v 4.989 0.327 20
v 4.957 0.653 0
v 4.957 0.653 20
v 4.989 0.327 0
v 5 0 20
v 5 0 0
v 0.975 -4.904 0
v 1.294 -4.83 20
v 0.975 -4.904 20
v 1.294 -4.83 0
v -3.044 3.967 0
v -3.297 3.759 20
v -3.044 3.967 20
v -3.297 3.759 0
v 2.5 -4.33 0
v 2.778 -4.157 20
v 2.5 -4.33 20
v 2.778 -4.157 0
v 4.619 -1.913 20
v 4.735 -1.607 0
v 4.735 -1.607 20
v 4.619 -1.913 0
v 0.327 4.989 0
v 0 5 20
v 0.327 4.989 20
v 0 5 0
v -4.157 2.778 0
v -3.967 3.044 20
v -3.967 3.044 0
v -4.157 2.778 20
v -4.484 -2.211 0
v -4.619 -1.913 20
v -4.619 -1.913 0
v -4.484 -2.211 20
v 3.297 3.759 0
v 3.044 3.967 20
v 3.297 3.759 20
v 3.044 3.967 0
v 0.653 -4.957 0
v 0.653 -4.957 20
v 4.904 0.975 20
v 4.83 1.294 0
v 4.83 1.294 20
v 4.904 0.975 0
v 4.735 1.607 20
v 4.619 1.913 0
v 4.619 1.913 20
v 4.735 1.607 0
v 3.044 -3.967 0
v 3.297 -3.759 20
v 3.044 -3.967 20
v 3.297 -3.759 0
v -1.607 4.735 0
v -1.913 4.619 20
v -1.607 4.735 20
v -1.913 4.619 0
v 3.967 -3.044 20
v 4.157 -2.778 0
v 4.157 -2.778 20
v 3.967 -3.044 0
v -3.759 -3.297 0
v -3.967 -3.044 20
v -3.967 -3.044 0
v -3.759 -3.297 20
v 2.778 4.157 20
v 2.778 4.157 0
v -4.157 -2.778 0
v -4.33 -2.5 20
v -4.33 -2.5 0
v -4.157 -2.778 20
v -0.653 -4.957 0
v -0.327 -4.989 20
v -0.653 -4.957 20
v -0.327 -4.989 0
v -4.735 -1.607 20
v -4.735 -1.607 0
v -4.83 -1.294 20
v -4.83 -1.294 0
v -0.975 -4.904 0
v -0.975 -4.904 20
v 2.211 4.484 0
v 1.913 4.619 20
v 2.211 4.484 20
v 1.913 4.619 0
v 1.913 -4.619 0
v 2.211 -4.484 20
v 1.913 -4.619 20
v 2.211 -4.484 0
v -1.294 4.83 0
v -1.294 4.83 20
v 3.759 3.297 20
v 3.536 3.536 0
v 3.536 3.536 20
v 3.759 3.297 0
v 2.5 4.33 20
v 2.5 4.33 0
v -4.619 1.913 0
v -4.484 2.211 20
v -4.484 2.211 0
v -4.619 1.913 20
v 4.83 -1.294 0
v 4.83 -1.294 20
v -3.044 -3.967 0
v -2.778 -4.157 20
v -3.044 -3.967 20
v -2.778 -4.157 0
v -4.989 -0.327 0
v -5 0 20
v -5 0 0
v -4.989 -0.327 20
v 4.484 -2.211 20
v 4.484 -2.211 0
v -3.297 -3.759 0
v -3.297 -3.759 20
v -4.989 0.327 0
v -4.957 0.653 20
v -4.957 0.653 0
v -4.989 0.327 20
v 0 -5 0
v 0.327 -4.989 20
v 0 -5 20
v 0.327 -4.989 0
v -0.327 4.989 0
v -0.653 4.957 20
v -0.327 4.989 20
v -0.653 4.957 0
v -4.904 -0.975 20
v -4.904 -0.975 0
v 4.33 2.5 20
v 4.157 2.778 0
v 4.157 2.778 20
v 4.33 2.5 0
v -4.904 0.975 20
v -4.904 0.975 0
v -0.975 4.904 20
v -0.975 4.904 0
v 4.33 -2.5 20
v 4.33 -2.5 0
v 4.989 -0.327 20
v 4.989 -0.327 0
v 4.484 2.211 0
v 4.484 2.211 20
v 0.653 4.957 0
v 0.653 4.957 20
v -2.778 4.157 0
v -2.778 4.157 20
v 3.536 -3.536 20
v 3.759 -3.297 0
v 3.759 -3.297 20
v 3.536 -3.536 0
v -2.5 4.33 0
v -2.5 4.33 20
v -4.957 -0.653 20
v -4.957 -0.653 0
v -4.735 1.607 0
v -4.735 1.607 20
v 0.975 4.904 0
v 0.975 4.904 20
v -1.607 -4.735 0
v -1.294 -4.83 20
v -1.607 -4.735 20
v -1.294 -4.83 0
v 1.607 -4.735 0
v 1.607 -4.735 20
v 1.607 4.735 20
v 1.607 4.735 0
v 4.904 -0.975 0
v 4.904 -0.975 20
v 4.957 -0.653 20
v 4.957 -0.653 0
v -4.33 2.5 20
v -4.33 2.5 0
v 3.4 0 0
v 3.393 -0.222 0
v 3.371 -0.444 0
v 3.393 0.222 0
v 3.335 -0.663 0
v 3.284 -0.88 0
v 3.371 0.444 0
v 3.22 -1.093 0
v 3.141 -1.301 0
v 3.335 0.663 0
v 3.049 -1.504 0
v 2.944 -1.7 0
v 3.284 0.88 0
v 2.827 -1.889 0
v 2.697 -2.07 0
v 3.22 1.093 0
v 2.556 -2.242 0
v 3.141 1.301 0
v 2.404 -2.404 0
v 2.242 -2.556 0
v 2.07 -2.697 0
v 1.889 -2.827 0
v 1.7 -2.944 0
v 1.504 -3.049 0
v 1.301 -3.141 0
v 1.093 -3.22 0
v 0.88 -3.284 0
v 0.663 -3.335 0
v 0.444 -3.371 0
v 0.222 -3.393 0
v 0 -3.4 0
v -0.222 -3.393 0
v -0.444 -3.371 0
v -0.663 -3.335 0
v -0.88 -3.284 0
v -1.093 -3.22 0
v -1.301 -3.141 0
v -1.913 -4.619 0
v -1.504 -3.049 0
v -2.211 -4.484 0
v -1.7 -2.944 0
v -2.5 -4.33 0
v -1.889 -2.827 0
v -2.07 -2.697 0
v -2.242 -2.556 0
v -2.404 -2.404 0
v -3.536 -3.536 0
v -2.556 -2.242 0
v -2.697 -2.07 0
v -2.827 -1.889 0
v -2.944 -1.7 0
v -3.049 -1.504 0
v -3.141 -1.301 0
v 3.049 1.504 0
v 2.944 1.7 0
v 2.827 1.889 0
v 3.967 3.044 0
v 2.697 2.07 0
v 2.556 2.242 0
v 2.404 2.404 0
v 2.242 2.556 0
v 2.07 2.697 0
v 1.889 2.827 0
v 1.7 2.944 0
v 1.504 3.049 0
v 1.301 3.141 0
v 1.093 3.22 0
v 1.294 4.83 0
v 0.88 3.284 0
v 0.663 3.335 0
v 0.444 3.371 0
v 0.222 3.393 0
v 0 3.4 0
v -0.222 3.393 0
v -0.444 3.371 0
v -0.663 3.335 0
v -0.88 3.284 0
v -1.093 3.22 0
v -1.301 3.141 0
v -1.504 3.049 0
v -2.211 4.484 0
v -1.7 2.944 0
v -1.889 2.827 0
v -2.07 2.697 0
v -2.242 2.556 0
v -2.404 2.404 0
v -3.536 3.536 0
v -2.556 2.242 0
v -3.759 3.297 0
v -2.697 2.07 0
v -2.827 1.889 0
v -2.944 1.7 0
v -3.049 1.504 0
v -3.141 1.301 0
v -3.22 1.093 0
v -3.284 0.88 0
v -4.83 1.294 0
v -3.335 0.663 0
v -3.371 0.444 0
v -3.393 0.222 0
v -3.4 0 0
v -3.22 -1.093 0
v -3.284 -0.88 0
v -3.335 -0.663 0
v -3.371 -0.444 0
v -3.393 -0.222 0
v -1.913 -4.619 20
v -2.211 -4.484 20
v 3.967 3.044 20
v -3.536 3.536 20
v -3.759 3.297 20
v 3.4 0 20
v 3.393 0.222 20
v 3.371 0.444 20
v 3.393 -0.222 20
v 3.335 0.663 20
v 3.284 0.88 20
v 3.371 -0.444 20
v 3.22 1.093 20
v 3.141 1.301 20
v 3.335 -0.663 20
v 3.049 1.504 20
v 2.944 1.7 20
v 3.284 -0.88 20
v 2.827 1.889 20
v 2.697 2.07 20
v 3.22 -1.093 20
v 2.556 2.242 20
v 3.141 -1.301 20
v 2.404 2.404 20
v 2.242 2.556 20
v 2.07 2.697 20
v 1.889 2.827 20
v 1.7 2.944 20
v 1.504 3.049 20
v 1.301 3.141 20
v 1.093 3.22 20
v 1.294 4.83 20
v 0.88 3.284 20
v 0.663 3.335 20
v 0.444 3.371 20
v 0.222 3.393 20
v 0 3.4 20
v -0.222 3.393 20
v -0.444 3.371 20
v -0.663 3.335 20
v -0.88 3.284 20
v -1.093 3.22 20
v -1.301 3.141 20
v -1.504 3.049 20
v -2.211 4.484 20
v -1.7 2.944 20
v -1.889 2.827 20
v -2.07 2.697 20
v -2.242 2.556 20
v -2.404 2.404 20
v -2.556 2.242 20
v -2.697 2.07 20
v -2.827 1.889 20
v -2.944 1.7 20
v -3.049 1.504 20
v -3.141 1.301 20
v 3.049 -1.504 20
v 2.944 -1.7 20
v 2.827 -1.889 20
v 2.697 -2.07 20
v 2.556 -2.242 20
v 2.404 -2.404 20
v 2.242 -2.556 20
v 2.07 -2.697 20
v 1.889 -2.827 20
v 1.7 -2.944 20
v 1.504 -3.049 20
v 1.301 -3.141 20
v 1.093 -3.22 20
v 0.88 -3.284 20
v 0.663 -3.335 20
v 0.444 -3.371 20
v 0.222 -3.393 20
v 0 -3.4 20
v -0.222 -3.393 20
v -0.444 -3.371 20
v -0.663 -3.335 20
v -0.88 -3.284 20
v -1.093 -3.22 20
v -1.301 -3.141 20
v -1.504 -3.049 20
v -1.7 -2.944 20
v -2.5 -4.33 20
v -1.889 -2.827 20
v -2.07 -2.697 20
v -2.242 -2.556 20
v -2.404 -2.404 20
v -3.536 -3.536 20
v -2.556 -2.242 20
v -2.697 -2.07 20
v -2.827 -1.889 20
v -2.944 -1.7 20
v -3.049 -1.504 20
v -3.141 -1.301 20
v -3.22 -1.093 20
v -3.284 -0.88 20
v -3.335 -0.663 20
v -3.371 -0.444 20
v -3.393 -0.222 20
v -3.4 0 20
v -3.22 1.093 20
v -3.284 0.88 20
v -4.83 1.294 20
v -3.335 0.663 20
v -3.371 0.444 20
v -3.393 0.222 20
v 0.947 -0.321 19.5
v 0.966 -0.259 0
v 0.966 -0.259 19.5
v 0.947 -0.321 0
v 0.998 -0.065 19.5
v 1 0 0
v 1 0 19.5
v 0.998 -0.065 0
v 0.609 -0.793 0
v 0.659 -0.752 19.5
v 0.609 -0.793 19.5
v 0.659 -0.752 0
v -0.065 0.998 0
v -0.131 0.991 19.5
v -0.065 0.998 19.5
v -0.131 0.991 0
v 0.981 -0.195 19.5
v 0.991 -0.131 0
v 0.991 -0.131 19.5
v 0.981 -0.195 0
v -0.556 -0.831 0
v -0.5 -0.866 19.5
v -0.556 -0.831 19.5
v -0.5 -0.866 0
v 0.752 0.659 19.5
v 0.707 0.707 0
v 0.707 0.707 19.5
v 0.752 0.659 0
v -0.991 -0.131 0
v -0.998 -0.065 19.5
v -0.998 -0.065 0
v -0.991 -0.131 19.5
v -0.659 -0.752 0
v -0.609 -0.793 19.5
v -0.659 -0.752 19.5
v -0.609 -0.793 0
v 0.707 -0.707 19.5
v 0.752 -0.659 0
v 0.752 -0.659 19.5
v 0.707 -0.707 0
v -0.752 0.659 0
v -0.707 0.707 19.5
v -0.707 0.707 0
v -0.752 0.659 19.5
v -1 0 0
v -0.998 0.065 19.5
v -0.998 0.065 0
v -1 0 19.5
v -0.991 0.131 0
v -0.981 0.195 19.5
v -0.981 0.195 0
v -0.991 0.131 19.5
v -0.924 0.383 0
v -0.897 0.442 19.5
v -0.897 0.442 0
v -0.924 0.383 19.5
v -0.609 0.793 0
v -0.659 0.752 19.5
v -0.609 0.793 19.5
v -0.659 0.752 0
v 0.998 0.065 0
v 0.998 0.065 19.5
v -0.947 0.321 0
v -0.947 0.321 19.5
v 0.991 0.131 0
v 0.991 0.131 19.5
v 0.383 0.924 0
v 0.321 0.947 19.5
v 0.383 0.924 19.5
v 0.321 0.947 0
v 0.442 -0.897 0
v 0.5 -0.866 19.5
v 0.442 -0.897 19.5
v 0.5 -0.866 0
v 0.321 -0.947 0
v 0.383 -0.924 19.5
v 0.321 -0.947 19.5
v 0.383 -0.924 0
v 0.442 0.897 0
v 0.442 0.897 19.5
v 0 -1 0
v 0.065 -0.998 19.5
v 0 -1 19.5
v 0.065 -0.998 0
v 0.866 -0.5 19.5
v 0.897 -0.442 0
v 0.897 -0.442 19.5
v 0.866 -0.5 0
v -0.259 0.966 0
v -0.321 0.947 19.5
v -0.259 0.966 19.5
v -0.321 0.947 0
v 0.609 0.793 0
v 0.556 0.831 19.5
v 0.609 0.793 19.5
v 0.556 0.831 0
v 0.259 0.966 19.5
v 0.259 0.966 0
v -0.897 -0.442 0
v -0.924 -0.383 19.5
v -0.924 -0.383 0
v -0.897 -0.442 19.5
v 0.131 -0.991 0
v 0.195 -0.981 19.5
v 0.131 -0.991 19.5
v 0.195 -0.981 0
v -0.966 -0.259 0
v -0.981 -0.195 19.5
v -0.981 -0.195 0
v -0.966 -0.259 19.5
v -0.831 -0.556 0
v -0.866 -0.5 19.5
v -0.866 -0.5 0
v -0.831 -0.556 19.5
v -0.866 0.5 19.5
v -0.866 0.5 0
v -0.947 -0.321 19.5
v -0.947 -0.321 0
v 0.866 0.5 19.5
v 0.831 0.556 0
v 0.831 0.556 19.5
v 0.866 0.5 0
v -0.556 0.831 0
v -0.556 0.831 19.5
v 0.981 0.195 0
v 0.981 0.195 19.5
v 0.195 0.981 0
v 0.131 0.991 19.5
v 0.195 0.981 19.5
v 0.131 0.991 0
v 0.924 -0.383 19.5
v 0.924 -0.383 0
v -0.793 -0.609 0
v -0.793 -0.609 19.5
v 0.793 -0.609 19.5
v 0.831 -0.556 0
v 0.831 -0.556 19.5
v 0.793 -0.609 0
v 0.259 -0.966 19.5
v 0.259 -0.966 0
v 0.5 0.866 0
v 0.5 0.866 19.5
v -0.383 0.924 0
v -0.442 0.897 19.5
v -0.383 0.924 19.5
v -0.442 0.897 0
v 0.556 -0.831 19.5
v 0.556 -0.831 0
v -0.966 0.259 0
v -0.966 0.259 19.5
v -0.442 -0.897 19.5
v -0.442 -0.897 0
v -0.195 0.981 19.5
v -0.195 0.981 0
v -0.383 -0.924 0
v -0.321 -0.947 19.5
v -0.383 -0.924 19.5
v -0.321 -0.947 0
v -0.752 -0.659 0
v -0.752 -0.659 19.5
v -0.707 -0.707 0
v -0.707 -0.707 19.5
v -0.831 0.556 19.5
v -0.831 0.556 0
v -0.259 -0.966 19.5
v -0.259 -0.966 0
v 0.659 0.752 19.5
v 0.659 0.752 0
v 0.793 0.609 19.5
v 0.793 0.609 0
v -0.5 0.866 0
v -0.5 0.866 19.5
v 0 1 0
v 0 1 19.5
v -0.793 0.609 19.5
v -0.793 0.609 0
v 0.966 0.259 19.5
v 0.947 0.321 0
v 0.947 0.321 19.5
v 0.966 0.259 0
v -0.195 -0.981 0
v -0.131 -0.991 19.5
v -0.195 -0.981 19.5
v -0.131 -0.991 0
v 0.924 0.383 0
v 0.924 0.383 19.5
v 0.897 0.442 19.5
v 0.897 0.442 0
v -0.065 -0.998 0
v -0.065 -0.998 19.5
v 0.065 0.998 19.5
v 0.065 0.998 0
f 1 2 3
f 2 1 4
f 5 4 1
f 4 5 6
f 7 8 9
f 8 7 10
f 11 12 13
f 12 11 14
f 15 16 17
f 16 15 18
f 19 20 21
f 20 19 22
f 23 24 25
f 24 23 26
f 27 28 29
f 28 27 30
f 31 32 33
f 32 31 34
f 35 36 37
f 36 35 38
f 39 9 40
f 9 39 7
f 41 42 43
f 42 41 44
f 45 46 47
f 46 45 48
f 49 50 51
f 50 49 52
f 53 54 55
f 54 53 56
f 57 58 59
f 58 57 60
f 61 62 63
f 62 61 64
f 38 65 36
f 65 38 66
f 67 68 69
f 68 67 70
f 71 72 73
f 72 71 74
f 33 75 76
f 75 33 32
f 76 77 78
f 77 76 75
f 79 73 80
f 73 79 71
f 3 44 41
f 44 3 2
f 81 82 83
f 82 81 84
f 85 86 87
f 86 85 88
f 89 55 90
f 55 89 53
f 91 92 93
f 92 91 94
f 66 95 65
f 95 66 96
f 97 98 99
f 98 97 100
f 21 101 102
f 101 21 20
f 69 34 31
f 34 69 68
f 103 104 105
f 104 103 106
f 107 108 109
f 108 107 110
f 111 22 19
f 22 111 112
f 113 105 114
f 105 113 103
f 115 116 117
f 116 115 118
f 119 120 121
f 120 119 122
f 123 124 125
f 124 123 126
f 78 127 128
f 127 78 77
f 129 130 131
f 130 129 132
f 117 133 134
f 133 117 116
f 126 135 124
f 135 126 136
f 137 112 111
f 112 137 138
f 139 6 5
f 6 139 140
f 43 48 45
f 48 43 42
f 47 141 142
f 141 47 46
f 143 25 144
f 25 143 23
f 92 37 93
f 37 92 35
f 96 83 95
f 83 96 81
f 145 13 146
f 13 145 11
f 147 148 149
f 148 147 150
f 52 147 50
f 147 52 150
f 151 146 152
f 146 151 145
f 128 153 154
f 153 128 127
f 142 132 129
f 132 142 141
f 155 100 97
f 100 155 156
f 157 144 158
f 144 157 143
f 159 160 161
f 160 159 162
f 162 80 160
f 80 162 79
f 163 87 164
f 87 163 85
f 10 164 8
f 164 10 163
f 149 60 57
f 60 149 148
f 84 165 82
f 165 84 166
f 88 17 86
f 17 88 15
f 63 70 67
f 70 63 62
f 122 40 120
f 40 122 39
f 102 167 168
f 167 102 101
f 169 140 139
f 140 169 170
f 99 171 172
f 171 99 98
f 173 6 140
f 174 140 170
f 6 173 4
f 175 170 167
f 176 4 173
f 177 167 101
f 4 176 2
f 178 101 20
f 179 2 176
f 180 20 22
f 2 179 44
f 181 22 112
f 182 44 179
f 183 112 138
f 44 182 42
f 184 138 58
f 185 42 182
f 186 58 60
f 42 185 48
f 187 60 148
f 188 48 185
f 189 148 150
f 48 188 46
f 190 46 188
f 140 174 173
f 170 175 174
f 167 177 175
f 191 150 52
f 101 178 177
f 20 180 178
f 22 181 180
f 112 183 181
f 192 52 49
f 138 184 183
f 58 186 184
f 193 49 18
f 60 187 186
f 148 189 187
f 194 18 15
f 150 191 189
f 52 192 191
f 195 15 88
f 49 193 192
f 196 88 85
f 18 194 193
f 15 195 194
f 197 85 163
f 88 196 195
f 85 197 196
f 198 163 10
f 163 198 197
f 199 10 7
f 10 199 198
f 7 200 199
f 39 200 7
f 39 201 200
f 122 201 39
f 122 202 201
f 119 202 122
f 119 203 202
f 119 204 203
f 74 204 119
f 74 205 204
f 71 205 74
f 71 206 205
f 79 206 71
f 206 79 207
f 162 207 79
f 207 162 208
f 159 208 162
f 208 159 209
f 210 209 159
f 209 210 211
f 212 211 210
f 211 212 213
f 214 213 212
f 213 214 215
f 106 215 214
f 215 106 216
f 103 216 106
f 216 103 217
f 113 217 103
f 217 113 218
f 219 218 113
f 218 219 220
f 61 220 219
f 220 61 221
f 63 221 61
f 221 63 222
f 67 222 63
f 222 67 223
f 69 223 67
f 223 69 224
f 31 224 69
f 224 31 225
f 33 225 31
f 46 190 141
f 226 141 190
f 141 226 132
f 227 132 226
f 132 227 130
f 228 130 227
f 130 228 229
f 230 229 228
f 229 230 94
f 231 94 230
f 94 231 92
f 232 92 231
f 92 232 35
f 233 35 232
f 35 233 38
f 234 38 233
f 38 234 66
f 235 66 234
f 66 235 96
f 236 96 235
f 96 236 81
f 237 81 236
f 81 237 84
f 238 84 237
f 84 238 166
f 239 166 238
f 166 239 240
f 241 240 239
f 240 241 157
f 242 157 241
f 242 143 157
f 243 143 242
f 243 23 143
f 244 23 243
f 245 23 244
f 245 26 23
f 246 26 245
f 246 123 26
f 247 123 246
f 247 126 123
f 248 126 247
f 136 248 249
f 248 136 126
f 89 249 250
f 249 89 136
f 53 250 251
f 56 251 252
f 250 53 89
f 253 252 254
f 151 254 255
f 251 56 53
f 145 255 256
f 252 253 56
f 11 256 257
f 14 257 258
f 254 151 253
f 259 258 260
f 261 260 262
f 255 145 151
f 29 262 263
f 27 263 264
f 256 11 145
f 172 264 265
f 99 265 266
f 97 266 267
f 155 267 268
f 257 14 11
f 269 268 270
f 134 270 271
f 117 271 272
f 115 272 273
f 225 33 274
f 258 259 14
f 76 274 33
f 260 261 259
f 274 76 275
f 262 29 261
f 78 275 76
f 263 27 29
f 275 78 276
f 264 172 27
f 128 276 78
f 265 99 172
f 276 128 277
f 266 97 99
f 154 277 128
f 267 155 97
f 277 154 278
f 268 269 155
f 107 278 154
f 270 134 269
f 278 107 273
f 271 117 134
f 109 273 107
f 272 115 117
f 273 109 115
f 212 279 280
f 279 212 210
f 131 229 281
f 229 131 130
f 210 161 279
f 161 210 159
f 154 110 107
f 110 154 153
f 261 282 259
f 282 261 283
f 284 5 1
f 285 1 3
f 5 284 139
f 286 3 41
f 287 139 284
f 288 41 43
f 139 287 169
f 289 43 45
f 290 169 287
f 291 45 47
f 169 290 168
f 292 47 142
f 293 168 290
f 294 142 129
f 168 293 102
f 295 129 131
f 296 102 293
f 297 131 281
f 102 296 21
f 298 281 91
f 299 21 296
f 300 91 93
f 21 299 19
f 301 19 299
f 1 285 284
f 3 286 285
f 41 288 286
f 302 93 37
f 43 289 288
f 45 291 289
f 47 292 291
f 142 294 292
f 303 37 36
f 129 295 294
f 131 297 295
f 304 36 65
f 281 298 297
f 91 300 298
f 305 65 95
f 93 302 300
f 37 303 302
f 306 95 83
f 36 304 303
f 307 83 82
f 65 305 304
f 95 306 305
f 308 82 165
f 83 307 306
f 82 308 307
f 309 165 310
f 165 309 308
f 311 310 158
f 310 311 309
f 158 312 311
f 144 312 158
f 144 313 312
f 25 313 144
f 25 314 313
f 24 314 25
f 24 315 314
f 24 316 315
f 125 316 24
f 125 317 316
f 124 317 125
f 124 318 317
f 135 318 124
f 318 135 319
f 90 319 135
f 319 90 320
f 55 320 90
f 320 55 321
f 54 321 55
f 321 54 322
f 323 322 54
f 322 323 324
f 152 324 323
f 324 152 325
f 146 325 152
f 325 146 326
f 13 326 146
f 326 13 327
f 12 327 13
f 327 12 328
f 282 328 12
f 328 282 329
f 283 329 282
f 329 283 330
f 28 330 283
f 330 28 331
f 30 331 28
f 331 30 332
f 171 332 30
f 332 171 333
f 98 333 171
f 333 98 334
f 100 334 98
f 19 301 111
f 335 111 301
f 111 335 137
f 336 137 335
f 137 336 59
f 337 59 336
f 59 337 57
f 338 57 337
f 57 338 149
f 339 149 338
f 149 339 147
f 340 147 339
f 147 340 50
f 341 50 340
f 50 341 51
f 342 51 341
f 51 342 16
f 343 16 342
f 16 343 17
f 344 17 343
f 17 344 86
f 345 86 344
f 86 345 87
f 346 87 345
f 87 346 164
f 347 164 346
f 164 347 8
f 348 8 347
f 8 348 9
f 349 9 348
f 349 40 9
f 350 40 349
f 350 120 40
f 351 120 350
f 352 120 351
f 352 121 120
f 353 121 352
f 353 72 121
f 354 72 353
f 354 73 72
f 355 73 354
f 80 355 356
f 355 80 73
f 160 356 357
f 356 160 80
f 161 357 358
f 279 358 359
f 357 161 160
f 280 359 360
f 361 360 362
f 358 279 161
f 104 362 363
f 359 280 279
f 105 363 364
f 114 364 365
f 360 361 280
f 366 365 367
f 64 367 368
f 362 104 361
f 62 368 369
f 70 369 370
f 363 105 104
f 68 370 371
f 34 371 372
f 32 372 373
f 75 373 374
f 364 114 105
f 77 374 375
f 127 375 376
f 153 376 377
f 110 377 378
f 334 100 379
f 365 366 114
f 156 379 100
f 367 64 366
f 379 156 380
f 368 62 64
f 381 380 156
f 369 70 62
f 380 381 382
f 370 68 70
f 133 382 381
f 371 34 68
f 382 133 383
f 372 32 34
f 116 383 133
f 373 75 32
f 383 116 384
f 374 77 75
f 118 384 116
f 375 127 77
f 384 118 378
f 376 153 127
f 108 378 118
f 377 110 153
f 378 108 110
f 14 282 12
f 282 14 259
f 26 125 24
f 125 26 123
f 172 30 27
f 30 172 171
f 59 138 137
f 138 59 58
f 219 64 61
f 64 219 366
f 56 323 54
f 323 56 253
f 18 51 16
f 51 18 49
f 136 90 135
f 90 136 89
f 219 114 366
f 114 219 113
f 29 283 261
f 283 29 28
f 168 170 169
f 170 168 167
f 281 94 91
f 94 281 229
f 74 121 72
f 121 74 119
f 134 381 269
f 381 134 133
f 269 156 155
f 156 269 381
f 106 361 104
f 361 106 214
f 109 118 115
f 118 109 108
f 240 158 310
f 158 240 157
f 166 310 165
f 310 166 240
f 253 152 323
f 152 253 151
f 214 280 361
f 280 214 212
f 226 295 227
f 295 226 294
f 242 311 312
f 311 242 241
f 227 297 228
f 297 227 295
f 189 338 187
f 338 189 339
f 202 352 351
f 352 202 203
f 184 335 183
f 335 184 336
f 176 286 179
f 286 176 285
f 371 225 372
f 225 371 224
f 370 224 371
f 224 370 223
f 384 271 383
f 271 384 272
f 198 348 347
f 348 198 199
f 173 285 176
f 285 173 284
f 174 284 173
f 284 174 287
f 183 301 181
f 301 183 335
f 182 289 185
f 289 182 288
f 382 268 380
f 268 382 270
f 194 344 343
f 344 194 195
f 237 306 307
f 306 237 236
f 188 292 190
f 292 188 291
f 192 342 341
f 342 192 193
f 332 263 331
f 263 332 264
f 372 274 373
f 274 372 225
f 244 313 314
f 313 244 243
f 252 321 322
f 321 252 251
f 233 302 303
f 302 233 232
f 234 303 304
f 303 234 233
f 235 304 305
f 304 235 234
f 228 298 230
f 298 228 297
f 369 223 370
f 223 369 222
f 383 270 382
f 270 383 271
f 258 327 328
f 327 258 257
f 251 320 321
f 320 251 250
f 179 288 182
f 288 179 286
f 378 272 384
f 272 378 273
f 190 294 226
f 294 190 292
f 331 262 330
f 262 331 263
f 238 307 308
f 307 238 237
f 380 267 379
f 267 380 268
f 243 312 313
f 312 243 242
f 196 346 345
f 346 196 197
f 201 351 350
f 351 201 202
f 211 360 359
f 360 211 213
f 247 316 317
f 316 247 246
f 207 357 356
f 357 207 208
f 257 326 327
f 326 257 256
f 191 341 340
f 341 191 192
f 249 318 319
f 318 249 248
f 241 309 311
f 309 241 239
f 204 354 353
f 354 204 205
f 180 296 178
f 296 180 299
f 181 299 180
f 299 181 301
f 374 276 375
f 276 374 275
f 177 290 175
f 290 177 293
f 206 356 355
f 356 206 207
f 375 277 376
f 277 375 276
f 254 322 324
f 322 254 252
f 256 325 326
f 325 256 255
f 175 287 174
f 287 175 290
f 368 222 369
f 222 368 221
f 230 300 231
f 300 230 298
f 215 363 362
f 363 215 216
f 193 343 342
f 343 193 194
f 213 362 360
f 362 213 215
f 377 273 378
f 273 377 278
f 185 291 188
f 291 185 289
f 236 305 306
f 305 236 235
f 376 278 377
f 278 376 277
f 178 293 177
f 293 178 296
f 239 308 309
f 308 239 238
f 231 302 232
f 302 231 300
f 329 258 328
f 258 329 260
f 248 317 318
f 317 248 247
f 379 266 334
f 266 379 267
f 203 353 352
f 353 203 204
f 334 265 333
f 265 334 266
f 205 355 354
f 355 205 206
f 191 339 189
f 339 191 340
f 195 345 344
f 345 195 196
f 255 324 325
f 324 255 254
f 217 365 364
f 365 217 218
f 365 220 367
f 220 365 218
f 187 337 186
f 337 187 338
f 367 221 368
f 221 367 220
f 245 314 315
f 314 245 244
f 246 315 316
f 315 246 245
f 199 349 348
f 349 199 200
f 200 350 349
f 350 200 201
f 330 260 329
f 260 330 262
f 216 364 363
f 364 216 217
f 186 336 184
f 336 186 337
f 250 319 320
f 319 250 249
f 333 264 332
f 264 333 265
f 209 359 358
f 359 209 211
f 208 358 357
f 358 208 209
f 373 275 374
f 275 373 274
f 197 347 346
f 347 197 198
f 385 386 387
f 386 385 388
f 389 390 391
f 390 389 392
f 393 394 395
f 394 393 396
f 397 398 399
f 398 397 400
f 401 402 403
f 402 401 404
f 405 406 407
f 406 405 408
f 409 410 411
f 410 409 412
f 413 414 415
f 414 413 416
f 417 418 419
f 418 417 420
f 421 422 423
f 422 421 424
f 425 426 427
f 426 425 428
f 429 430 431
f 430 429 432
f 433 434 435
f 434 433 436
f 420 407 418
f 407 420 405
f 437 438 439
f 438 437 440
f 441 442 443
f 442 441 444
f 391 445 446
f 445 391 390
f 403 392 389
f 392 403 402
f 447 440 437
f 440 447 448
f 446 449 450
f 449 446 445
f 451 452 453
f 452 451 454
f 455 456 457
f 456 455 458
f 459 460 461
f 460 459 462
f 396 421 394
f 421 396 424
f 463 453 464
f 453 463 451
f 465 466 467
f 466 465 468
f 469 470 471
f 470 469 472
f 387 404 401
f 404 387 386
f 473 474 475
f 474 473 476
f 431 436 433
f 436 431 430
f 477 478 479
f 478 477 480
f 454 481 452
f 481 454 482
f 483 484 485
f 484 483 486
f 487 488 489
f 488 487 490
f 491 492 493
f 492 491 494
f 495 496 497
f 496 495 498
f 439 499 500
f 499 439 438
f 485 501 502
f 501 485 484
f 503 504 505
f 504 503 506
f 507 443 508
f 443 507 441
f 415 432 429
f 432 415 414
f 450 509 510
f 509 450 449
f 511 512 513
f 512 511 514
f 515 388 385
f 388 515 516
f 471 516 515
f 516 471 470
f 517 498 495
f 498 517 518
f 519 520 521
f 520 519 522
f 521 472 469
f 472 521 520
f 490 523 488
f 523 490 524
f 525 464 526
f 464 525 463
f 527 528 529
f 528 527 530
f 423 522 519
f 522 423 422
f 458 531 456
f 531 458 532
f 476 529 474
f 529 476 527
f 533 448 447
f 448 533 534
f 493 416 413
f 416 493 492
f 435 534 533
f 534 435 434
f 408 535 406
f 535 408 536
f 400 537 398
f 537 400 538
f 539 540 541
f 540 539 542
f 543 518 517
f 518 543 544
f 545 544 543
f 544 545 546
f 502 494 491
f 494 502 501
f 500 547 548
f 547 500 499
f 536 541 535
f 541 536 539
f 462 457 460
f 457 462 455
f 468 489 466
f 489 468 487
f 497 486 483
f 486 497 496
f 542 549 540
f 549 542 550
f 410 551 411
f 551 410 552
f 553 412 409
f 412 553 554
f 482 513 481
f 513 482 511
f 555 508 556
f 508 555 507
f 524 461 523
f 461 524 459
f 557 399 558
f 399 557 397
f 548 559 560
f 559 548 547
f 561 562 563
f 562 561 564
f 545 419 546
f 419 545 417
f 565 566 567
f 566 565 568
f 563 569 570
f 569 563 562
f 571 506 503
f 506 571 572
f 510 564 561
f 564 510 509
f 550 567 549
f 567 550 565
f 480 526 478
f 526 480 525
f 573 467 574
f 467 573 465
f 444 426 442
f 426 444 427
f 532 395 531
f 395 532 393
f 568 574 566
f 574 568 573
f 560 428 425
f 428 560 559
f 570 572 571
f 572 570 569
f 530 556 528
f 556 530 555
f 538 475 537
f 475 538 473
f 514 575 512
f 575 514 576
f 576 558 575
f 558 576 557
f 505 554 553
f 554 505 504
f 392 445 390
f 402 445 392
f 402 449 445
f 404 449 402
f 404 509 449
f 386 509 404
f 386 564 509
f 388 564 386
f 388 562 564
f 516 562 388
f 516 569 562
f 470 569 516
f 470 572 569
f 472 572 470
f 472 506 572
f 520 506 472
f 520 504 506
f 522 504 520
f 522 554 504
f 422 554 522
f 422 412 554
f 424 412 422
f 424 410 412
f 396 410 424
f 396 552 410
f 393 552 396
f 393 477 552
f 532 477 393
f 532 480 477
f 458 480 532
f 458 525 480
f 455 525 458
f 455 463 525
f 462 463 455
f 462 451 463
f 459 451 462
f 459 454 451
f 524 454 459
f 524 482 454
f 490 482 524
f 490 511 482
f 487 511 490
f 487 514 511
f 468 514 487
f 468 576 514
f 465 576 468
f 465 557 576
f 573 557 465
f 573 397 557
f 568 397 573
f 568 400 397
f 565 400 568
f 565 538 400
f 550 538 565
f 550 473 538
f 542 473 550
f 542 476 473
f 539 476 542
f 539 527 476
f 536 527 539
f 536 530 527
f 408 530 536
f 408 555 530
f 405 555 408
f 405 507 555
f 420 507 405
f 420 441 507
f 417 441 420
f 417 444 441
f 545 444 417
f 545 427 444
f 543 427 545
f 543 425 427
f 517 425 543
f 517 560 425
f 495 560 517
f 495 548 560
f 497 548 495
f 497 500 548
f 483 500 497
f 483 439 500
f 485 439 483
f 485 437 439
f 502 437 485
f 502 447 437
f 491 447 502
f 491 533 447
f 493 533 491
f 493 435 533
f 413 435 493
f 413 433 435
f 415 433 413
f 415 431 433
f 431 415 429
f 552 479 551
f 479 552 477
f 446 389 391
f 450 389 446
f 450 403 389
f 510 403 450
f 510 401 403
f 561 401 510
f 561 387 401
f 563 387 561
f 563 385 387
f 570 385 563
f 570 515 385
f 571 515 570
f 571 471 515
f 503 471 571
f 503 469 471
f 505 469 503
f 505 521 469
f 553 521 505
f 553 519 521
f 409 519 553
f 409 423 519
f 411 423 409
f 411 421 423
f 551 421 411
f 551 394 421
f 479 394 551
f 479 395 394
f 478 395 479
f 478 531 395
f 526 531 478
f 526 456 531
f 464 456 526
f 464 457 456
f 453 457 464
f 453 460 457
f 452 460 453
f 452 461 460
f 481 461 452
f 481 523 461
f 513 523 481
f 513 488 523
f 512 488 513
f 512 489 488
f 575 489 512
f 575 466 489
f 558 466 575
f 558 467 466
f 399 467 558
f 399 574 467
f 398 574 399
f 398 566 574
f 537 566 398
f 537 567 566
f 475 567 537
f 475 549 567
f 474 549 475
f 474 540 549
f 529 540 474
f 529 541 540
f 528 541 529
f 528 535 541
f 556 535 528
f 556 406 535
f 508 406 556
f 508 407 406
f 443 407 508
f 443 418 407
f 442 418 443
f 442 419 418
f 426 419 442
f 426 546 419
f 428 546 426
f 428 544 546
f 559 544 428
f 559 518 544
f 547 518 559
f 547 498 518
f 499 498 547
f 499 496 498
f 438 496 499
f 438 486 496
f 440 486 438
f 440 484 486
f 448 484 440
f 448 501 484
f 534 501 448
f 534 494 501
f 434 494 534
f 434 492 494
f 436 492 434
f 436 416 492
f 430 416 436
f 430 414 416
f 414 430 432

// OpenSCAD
// Funnel with spout - printed upright, wide opening at the top
// Units: mm. Wall thickness: 1.6 mm throughout.

// ---- Parameters ----
spout_d        = 10;   // spout outer diameter
spout_bore     = 6.8;  // spout bore (10 - 2*1.6)
spout_h        = 20;   // spout height (z = 0 to 20)
cone_top_d     = 60;   // cone rim outer diameter at z = 50
cone_bottom_d  = 10;   // cone base outer diameter at z = 20 (matches spout)
cone_h         = 30;   // cone height (z = 20 to 50)
wall           = 1.6;  // wall thickness
eps            = 0.5;  // cutter overshoot past faces
$fn            = 96;   // curve resolution

// ---- Derived ----
cone_rim_r     = cone_top_d / 2;   // rim radius at z = 50
cone_base_r    = cone_bottom_d / 2; // base radius at z = 20
spout_r        = spout_d / 2;
spout_bore_r   = spout_bore / 2;

// ---- Model ----
union() {
    // Spout: tube from z = 0 to 20
    difference() {
        cylinder(d = spout_d, h = spout_h);
        translate([0, 0, -eps])
            cylinder(d = spout_bore, h = spout_h + 2 * eps);
    }

    // Cone: widens from 10 mm at z = 20 to 60 mm at z = 50
    difference() {
        // Cone shell: outer surface minus an inner cone, leaving a constant 1.6 mm wall
        linear_extrude(height = cone_h)
            circle(r1 = cone_base_r, r2 = cone_rim_r);
        translate([0, 0, spout_h - eps])
            linear_extrude(height = cone_h + 2 * eps)
                circle(r1 = cone_base_r - wall, r2 = cone_rim_r - wall);
    }
}
